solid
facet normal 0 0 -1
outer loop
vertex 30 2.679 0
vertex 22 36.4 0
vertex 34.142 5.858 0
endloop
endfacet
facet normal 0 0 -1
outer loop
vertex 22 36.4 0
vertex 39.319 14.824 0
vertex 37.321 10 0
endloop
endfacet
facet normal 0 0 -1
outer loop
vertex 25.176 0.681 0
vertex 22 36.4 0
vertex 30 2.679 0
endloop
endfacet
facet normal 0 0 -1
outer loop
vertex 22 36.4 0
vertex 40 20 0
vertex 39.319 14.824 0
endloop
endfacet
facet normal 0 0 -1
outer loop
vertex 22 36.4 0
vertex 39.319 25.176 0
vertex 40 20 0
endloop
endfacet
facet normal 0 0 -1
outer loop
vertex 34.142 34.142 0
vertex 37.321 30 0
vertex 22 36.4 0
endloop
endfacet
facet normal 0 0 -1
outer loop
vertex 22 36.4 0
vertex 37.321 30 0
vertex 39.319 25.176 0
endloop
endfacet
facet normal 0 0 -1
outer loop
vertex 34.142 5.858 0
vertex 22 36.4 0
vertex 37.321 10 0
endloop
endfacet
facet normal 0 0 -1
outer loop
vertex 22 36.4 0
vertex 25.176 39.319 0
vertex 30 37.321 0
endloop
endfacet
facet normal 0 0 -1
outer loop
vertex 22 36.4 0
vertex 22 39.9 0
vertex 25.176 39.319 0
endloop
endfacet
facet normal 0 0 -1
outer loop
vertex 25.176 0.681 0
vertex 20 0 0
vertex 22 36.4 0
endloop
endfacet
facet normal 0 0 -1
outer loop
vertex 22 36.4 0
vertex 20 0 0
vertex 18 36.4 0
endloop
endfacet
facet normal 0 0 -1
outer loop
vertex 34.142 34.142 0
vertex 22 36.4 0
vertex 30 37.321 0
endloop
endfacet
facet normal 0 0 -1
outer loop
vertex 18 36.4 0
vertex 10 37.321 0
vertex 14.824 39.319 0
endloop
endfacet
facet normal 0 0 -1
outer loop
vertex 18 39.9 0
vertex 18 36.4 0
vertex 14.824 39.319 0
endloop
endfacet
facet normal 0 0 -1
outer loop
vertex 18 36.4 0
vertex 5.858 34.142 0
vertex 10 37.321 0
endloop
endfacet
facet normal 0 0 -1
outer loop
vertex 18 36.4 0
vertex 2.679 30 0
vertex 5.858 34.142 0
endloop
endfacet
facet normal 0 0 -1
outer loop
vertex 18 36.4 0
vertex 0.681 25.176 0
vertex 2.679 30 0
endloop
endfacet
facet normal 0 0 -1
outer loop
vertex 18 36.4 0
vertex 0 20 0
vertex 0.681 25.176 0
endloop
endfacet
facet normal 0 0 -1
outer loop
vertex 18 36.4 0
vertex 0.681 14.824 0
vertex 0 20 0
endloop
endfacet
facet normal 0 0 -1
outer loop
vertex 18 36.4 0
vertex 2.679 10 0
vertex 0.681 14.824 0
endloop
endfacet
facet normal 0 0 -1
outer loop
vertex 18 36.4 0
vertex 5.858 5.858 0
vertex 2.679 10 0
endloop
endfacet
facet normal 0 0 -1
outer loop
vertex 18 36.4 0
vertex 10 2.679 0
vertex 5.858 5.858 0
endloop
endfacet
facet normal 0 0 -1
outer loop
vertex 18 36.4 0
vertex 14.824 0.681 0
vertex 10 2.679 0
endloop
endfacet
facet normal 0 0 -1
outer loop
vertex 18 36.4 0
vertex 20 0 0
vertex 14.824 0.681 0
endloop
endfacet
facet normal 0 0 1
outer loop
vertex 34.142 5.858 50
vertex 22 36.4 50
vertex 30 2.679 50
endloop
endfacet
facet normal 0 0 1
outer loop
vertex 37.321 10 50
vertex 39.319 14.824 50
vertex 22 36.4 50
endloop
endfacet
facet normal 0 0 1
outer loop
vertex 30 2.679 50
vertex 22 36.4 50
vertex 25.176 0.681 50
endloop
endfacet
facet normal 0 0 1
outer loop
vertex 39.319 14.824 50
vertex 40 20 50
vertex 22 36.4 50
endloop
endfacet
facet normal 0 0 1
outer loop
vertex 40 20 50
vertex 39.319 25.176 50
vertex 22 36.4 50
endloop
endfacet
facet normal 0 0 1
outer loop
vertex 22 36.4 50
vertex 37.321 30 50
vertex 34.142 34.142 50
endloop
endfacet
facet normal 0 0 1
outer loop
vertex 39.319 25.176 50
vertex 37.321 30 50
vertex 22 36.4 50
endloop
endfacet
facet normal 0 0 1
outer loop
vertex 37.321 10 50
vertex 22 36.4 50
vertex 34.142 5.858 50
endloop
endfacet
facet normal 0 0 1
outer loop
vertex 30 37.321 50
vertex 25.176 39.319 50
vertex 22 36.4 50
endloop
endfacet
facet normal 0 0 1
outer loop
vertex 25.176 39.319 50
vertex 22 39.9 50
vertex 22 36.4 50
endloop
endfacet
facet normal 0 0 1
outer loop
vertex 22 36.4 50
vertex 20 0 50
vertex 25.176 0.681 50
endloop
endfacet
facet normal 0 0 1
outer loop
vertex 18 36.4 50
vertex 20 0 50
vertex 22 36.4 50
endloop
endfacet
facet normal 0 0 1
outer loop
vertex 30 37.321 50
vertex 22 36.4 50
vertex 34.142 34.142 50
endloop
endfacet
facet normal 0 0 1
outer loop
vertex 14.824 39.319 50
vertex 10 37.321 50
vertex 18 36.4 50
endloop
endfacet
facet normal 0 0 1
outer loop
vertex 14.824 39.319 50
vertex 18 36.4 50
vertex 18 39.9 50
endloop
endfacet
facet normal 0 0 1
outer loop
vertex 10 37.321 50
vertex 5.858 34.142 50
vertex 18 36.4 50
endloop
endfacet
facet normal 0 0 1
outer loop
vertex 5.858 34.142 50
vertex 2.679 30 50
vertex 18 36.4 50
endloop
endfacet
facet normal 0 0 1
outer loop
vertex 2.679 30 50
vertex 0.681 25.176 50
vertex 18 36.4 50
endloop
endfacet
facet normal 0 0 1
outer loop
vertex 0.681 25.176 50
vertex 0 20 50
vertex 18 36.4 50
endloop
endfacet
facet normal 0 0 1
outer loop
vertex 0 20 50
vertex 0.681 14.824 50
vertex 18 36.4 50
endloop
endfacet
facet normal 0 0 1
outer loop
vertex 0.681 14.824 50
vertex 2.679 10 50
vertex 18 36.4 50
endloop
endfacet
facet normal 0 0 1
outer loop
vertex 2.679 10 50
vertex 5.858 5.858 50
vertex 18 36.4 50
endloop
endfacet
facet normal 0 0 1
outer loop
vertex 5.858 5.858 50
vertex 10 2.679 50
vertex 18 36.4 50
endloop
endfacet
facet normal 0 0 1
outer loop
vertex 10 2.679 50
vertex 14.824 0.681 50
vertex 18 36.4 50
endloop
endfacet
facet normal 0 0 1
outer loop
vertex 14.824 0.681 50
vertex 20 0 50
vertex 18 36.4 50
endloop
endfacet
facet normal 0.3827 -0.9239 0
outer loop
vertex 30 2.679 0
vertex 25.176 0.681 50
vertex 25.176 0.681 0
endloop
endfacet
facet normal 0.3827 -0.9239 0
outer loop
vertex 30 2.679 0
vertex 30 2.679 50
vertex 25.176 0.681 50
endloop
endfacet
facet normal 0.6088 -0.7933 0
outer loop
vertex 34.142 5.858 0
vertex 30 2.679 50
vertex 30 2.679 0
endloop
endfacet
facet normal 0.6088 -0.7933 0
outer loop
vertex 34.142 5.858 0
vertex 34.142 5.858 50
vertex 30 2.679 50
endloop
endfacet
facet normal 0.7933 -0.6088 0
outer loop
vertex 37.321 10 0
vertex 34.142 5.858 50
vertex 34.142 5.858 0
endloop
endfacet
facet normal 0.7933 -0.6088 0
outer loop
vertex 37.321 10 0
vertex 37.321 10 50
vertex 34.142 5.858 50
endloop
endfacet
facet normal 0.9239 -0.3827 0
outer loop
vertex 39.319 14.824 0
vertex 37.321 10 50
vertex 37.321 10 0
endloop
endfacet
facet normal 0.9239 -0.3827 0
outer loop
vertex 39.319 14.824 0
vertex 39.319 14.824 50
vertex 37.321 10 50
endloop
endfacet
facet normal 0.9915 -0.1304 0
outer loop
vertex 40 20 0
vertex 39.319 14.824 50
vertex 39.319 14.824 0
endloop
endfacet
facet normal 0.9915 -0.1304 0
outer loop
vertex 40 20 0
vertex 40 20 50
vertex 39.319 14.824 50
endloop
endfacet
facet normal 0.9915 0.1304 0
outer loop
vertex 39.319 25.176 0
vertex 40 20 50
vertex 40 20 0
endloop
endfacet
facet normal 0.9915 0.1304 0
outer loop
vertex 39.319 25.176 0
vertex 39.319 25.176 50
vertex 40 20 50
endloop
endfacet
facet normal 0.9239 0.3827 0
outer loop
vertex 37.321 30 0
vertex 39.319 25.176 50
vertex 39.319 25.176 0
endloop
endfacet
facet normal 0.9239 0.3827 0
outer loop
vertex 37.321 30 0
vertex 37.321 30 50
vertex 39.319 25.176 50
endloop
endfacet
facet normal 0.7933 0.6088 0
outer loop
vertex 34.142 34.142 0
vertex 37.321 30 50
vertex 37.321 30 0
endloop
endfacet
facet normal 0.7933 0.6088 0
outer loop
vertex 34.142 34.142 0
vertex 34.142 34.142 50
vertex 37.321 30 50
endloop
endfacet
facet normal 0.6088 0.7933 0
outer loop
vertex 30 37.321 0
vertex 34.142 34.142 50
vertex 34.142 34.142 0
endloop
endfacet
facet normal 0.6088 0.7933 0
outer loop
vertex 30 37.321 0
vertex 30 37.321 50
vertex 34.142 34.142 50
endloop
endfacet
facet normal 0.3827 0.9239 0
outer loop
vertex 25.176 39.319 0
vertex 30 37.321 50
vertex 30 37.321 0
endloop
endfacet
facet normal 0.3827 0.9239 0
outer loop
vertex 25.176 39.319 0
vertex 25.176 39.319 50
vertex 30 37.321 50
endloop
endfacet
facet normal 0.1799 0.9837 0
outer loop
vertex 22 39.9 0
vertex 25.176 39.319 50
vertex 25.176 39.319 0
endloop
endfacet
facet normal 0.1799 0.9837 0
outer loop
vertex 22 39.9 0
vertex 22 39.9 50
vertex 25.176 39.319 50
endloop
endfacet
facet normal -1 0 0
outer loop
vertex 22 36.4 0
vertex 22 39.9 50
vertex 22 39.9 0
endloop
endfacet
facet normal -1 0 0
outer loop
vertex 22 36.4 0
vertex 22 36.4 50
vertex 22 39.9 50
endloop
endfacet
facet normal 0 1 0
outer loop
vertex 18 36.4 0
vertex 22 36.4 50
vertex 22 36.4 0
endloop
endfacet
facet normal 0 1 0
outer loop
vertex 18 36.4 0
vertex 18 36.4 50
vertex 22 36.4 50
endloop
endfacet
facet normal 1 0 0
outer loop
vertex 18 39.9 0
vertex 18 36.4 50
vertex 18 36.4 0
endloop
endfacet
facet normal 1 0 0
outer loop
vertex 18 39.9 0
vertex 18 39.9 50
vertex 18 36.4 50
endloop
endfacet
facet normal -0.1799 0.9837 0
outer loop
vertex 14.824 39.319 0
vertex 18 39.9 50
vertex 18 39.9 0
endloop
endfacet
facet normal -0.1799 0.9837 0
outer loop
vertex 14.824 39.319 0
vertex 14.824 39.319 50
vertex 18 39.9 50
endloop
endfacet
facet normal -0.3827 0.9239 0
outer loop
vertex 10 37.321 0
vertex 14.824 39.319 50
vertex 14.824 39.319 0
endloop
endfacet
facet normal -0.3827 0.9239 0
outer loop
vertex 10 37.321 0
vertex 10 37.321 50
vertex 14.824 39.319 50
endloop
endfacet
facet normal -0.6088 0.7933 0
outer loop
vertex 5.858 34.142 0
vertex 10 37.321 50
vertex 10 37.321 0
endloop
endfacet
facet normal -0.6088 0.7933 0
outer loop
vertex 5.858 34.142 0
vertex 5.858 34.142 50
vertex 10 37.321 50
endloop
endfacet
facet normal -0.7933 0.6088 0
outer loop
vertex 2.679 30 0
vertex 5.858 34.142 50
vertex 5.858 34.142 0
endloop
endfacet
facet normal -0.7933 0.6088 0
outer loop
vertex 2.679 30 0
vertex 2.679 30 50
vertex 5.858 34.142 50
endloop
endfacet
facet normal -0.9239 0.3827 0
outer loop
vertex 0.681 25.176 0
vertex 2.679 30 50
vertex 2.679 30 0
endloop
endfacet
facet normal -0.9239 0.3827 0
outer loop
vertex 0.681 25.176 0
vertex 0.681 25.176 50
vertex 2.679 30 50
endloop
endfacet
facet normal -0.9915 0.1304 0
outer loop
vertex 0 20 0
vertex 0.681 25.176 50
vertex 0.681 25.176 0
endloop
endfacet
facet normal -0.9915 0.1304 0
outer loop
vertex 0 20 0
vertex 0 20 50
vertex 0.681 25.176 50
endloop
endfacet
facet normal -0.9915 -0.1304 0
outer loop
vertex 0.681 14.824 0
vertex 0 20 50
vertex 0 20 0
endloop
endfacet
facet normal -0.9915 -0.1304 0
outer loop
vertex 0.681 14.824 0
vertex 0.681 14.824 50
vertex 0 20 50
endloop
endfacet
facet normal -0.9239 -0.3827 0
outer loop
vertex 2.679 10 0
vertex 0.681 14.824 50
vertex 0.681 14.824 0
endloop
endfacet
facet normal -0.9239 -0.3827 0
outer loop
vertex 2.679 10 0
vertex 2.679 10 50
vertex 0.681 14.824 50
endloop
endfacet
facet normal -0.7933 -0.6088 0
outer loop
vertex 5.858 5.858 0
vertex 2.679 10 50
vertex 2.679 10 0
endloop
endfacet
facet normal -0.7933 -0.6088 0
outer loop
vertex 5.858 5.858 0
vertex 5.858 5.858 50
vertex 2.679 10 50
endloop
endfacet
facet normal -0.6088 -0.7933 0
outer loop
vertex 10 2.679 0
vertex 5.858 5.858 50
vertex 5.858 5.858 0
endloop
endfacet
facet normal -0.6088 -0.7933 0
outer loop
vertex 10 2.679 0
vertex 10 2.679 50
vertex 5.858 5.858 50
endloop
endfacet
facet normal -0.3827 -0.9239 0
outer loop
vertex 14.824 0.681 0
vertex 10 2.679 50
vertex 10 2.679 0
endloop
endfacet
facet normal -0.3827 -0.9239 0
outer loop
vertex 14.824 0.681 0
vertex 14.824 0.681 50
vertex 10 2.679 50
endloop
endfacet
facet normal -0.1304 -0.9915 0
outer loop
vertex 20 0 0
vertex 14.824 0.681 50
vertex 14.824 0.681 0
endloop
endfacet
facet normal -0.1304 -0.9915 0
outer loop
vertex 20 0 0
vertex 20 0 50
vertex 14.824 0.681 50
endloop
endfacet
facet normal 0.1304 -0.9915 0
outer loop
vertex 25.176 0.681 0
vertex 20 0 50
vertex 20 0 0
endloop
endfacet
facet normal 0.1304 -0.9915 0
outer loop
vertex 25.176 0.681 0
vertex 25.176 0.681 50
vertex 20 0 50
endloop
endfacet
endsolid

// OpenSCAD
$fn = 32;

// ----------------------------------------------------------------------
// Keyway shaft: d40 shaft, key 4 x 3.5 mm
// ----------------------------------------------------------------------

// --- parameters (mm) ---
shaft_r = 20;             // shaft radius
key_w = 4;                // keyway width
key_d = 3.5;              // keyway depth below the surface line
plate_t = 50;             // shaft length, Z (extrusion height)

shaft_d = 2 * shaft_r;  // shaft diameter
circle_step = 15;  // polygon sampling step, degrees

profile = [[14.824, 39.319], [10, 37.321], [5.858, 34.142], [2.679, 30], [0.681, 25.176], [0, 20], [0.681, 14.824], [2.679, 10], [5.858, 5.858], [10, 2.679], [14.824, 0.681], [20, 0], [25.176, 0.681], [30, 2.679], [34.142, 5.858], [37.321, 10], [39.319, 14.824], [40, 20], [39.319, 25.176], [37.321, 30], [34.142, 34.142], [30, 37.321], [25.176, 39.319], [22, 39.9], [22, 36.4], [18, 36.4], [18, 39.9]];  // primary outline, 27 points, counter clockwise

// --- the one profile operation ---
linear_extrude(height = plate_t) polygon(points = profile);
